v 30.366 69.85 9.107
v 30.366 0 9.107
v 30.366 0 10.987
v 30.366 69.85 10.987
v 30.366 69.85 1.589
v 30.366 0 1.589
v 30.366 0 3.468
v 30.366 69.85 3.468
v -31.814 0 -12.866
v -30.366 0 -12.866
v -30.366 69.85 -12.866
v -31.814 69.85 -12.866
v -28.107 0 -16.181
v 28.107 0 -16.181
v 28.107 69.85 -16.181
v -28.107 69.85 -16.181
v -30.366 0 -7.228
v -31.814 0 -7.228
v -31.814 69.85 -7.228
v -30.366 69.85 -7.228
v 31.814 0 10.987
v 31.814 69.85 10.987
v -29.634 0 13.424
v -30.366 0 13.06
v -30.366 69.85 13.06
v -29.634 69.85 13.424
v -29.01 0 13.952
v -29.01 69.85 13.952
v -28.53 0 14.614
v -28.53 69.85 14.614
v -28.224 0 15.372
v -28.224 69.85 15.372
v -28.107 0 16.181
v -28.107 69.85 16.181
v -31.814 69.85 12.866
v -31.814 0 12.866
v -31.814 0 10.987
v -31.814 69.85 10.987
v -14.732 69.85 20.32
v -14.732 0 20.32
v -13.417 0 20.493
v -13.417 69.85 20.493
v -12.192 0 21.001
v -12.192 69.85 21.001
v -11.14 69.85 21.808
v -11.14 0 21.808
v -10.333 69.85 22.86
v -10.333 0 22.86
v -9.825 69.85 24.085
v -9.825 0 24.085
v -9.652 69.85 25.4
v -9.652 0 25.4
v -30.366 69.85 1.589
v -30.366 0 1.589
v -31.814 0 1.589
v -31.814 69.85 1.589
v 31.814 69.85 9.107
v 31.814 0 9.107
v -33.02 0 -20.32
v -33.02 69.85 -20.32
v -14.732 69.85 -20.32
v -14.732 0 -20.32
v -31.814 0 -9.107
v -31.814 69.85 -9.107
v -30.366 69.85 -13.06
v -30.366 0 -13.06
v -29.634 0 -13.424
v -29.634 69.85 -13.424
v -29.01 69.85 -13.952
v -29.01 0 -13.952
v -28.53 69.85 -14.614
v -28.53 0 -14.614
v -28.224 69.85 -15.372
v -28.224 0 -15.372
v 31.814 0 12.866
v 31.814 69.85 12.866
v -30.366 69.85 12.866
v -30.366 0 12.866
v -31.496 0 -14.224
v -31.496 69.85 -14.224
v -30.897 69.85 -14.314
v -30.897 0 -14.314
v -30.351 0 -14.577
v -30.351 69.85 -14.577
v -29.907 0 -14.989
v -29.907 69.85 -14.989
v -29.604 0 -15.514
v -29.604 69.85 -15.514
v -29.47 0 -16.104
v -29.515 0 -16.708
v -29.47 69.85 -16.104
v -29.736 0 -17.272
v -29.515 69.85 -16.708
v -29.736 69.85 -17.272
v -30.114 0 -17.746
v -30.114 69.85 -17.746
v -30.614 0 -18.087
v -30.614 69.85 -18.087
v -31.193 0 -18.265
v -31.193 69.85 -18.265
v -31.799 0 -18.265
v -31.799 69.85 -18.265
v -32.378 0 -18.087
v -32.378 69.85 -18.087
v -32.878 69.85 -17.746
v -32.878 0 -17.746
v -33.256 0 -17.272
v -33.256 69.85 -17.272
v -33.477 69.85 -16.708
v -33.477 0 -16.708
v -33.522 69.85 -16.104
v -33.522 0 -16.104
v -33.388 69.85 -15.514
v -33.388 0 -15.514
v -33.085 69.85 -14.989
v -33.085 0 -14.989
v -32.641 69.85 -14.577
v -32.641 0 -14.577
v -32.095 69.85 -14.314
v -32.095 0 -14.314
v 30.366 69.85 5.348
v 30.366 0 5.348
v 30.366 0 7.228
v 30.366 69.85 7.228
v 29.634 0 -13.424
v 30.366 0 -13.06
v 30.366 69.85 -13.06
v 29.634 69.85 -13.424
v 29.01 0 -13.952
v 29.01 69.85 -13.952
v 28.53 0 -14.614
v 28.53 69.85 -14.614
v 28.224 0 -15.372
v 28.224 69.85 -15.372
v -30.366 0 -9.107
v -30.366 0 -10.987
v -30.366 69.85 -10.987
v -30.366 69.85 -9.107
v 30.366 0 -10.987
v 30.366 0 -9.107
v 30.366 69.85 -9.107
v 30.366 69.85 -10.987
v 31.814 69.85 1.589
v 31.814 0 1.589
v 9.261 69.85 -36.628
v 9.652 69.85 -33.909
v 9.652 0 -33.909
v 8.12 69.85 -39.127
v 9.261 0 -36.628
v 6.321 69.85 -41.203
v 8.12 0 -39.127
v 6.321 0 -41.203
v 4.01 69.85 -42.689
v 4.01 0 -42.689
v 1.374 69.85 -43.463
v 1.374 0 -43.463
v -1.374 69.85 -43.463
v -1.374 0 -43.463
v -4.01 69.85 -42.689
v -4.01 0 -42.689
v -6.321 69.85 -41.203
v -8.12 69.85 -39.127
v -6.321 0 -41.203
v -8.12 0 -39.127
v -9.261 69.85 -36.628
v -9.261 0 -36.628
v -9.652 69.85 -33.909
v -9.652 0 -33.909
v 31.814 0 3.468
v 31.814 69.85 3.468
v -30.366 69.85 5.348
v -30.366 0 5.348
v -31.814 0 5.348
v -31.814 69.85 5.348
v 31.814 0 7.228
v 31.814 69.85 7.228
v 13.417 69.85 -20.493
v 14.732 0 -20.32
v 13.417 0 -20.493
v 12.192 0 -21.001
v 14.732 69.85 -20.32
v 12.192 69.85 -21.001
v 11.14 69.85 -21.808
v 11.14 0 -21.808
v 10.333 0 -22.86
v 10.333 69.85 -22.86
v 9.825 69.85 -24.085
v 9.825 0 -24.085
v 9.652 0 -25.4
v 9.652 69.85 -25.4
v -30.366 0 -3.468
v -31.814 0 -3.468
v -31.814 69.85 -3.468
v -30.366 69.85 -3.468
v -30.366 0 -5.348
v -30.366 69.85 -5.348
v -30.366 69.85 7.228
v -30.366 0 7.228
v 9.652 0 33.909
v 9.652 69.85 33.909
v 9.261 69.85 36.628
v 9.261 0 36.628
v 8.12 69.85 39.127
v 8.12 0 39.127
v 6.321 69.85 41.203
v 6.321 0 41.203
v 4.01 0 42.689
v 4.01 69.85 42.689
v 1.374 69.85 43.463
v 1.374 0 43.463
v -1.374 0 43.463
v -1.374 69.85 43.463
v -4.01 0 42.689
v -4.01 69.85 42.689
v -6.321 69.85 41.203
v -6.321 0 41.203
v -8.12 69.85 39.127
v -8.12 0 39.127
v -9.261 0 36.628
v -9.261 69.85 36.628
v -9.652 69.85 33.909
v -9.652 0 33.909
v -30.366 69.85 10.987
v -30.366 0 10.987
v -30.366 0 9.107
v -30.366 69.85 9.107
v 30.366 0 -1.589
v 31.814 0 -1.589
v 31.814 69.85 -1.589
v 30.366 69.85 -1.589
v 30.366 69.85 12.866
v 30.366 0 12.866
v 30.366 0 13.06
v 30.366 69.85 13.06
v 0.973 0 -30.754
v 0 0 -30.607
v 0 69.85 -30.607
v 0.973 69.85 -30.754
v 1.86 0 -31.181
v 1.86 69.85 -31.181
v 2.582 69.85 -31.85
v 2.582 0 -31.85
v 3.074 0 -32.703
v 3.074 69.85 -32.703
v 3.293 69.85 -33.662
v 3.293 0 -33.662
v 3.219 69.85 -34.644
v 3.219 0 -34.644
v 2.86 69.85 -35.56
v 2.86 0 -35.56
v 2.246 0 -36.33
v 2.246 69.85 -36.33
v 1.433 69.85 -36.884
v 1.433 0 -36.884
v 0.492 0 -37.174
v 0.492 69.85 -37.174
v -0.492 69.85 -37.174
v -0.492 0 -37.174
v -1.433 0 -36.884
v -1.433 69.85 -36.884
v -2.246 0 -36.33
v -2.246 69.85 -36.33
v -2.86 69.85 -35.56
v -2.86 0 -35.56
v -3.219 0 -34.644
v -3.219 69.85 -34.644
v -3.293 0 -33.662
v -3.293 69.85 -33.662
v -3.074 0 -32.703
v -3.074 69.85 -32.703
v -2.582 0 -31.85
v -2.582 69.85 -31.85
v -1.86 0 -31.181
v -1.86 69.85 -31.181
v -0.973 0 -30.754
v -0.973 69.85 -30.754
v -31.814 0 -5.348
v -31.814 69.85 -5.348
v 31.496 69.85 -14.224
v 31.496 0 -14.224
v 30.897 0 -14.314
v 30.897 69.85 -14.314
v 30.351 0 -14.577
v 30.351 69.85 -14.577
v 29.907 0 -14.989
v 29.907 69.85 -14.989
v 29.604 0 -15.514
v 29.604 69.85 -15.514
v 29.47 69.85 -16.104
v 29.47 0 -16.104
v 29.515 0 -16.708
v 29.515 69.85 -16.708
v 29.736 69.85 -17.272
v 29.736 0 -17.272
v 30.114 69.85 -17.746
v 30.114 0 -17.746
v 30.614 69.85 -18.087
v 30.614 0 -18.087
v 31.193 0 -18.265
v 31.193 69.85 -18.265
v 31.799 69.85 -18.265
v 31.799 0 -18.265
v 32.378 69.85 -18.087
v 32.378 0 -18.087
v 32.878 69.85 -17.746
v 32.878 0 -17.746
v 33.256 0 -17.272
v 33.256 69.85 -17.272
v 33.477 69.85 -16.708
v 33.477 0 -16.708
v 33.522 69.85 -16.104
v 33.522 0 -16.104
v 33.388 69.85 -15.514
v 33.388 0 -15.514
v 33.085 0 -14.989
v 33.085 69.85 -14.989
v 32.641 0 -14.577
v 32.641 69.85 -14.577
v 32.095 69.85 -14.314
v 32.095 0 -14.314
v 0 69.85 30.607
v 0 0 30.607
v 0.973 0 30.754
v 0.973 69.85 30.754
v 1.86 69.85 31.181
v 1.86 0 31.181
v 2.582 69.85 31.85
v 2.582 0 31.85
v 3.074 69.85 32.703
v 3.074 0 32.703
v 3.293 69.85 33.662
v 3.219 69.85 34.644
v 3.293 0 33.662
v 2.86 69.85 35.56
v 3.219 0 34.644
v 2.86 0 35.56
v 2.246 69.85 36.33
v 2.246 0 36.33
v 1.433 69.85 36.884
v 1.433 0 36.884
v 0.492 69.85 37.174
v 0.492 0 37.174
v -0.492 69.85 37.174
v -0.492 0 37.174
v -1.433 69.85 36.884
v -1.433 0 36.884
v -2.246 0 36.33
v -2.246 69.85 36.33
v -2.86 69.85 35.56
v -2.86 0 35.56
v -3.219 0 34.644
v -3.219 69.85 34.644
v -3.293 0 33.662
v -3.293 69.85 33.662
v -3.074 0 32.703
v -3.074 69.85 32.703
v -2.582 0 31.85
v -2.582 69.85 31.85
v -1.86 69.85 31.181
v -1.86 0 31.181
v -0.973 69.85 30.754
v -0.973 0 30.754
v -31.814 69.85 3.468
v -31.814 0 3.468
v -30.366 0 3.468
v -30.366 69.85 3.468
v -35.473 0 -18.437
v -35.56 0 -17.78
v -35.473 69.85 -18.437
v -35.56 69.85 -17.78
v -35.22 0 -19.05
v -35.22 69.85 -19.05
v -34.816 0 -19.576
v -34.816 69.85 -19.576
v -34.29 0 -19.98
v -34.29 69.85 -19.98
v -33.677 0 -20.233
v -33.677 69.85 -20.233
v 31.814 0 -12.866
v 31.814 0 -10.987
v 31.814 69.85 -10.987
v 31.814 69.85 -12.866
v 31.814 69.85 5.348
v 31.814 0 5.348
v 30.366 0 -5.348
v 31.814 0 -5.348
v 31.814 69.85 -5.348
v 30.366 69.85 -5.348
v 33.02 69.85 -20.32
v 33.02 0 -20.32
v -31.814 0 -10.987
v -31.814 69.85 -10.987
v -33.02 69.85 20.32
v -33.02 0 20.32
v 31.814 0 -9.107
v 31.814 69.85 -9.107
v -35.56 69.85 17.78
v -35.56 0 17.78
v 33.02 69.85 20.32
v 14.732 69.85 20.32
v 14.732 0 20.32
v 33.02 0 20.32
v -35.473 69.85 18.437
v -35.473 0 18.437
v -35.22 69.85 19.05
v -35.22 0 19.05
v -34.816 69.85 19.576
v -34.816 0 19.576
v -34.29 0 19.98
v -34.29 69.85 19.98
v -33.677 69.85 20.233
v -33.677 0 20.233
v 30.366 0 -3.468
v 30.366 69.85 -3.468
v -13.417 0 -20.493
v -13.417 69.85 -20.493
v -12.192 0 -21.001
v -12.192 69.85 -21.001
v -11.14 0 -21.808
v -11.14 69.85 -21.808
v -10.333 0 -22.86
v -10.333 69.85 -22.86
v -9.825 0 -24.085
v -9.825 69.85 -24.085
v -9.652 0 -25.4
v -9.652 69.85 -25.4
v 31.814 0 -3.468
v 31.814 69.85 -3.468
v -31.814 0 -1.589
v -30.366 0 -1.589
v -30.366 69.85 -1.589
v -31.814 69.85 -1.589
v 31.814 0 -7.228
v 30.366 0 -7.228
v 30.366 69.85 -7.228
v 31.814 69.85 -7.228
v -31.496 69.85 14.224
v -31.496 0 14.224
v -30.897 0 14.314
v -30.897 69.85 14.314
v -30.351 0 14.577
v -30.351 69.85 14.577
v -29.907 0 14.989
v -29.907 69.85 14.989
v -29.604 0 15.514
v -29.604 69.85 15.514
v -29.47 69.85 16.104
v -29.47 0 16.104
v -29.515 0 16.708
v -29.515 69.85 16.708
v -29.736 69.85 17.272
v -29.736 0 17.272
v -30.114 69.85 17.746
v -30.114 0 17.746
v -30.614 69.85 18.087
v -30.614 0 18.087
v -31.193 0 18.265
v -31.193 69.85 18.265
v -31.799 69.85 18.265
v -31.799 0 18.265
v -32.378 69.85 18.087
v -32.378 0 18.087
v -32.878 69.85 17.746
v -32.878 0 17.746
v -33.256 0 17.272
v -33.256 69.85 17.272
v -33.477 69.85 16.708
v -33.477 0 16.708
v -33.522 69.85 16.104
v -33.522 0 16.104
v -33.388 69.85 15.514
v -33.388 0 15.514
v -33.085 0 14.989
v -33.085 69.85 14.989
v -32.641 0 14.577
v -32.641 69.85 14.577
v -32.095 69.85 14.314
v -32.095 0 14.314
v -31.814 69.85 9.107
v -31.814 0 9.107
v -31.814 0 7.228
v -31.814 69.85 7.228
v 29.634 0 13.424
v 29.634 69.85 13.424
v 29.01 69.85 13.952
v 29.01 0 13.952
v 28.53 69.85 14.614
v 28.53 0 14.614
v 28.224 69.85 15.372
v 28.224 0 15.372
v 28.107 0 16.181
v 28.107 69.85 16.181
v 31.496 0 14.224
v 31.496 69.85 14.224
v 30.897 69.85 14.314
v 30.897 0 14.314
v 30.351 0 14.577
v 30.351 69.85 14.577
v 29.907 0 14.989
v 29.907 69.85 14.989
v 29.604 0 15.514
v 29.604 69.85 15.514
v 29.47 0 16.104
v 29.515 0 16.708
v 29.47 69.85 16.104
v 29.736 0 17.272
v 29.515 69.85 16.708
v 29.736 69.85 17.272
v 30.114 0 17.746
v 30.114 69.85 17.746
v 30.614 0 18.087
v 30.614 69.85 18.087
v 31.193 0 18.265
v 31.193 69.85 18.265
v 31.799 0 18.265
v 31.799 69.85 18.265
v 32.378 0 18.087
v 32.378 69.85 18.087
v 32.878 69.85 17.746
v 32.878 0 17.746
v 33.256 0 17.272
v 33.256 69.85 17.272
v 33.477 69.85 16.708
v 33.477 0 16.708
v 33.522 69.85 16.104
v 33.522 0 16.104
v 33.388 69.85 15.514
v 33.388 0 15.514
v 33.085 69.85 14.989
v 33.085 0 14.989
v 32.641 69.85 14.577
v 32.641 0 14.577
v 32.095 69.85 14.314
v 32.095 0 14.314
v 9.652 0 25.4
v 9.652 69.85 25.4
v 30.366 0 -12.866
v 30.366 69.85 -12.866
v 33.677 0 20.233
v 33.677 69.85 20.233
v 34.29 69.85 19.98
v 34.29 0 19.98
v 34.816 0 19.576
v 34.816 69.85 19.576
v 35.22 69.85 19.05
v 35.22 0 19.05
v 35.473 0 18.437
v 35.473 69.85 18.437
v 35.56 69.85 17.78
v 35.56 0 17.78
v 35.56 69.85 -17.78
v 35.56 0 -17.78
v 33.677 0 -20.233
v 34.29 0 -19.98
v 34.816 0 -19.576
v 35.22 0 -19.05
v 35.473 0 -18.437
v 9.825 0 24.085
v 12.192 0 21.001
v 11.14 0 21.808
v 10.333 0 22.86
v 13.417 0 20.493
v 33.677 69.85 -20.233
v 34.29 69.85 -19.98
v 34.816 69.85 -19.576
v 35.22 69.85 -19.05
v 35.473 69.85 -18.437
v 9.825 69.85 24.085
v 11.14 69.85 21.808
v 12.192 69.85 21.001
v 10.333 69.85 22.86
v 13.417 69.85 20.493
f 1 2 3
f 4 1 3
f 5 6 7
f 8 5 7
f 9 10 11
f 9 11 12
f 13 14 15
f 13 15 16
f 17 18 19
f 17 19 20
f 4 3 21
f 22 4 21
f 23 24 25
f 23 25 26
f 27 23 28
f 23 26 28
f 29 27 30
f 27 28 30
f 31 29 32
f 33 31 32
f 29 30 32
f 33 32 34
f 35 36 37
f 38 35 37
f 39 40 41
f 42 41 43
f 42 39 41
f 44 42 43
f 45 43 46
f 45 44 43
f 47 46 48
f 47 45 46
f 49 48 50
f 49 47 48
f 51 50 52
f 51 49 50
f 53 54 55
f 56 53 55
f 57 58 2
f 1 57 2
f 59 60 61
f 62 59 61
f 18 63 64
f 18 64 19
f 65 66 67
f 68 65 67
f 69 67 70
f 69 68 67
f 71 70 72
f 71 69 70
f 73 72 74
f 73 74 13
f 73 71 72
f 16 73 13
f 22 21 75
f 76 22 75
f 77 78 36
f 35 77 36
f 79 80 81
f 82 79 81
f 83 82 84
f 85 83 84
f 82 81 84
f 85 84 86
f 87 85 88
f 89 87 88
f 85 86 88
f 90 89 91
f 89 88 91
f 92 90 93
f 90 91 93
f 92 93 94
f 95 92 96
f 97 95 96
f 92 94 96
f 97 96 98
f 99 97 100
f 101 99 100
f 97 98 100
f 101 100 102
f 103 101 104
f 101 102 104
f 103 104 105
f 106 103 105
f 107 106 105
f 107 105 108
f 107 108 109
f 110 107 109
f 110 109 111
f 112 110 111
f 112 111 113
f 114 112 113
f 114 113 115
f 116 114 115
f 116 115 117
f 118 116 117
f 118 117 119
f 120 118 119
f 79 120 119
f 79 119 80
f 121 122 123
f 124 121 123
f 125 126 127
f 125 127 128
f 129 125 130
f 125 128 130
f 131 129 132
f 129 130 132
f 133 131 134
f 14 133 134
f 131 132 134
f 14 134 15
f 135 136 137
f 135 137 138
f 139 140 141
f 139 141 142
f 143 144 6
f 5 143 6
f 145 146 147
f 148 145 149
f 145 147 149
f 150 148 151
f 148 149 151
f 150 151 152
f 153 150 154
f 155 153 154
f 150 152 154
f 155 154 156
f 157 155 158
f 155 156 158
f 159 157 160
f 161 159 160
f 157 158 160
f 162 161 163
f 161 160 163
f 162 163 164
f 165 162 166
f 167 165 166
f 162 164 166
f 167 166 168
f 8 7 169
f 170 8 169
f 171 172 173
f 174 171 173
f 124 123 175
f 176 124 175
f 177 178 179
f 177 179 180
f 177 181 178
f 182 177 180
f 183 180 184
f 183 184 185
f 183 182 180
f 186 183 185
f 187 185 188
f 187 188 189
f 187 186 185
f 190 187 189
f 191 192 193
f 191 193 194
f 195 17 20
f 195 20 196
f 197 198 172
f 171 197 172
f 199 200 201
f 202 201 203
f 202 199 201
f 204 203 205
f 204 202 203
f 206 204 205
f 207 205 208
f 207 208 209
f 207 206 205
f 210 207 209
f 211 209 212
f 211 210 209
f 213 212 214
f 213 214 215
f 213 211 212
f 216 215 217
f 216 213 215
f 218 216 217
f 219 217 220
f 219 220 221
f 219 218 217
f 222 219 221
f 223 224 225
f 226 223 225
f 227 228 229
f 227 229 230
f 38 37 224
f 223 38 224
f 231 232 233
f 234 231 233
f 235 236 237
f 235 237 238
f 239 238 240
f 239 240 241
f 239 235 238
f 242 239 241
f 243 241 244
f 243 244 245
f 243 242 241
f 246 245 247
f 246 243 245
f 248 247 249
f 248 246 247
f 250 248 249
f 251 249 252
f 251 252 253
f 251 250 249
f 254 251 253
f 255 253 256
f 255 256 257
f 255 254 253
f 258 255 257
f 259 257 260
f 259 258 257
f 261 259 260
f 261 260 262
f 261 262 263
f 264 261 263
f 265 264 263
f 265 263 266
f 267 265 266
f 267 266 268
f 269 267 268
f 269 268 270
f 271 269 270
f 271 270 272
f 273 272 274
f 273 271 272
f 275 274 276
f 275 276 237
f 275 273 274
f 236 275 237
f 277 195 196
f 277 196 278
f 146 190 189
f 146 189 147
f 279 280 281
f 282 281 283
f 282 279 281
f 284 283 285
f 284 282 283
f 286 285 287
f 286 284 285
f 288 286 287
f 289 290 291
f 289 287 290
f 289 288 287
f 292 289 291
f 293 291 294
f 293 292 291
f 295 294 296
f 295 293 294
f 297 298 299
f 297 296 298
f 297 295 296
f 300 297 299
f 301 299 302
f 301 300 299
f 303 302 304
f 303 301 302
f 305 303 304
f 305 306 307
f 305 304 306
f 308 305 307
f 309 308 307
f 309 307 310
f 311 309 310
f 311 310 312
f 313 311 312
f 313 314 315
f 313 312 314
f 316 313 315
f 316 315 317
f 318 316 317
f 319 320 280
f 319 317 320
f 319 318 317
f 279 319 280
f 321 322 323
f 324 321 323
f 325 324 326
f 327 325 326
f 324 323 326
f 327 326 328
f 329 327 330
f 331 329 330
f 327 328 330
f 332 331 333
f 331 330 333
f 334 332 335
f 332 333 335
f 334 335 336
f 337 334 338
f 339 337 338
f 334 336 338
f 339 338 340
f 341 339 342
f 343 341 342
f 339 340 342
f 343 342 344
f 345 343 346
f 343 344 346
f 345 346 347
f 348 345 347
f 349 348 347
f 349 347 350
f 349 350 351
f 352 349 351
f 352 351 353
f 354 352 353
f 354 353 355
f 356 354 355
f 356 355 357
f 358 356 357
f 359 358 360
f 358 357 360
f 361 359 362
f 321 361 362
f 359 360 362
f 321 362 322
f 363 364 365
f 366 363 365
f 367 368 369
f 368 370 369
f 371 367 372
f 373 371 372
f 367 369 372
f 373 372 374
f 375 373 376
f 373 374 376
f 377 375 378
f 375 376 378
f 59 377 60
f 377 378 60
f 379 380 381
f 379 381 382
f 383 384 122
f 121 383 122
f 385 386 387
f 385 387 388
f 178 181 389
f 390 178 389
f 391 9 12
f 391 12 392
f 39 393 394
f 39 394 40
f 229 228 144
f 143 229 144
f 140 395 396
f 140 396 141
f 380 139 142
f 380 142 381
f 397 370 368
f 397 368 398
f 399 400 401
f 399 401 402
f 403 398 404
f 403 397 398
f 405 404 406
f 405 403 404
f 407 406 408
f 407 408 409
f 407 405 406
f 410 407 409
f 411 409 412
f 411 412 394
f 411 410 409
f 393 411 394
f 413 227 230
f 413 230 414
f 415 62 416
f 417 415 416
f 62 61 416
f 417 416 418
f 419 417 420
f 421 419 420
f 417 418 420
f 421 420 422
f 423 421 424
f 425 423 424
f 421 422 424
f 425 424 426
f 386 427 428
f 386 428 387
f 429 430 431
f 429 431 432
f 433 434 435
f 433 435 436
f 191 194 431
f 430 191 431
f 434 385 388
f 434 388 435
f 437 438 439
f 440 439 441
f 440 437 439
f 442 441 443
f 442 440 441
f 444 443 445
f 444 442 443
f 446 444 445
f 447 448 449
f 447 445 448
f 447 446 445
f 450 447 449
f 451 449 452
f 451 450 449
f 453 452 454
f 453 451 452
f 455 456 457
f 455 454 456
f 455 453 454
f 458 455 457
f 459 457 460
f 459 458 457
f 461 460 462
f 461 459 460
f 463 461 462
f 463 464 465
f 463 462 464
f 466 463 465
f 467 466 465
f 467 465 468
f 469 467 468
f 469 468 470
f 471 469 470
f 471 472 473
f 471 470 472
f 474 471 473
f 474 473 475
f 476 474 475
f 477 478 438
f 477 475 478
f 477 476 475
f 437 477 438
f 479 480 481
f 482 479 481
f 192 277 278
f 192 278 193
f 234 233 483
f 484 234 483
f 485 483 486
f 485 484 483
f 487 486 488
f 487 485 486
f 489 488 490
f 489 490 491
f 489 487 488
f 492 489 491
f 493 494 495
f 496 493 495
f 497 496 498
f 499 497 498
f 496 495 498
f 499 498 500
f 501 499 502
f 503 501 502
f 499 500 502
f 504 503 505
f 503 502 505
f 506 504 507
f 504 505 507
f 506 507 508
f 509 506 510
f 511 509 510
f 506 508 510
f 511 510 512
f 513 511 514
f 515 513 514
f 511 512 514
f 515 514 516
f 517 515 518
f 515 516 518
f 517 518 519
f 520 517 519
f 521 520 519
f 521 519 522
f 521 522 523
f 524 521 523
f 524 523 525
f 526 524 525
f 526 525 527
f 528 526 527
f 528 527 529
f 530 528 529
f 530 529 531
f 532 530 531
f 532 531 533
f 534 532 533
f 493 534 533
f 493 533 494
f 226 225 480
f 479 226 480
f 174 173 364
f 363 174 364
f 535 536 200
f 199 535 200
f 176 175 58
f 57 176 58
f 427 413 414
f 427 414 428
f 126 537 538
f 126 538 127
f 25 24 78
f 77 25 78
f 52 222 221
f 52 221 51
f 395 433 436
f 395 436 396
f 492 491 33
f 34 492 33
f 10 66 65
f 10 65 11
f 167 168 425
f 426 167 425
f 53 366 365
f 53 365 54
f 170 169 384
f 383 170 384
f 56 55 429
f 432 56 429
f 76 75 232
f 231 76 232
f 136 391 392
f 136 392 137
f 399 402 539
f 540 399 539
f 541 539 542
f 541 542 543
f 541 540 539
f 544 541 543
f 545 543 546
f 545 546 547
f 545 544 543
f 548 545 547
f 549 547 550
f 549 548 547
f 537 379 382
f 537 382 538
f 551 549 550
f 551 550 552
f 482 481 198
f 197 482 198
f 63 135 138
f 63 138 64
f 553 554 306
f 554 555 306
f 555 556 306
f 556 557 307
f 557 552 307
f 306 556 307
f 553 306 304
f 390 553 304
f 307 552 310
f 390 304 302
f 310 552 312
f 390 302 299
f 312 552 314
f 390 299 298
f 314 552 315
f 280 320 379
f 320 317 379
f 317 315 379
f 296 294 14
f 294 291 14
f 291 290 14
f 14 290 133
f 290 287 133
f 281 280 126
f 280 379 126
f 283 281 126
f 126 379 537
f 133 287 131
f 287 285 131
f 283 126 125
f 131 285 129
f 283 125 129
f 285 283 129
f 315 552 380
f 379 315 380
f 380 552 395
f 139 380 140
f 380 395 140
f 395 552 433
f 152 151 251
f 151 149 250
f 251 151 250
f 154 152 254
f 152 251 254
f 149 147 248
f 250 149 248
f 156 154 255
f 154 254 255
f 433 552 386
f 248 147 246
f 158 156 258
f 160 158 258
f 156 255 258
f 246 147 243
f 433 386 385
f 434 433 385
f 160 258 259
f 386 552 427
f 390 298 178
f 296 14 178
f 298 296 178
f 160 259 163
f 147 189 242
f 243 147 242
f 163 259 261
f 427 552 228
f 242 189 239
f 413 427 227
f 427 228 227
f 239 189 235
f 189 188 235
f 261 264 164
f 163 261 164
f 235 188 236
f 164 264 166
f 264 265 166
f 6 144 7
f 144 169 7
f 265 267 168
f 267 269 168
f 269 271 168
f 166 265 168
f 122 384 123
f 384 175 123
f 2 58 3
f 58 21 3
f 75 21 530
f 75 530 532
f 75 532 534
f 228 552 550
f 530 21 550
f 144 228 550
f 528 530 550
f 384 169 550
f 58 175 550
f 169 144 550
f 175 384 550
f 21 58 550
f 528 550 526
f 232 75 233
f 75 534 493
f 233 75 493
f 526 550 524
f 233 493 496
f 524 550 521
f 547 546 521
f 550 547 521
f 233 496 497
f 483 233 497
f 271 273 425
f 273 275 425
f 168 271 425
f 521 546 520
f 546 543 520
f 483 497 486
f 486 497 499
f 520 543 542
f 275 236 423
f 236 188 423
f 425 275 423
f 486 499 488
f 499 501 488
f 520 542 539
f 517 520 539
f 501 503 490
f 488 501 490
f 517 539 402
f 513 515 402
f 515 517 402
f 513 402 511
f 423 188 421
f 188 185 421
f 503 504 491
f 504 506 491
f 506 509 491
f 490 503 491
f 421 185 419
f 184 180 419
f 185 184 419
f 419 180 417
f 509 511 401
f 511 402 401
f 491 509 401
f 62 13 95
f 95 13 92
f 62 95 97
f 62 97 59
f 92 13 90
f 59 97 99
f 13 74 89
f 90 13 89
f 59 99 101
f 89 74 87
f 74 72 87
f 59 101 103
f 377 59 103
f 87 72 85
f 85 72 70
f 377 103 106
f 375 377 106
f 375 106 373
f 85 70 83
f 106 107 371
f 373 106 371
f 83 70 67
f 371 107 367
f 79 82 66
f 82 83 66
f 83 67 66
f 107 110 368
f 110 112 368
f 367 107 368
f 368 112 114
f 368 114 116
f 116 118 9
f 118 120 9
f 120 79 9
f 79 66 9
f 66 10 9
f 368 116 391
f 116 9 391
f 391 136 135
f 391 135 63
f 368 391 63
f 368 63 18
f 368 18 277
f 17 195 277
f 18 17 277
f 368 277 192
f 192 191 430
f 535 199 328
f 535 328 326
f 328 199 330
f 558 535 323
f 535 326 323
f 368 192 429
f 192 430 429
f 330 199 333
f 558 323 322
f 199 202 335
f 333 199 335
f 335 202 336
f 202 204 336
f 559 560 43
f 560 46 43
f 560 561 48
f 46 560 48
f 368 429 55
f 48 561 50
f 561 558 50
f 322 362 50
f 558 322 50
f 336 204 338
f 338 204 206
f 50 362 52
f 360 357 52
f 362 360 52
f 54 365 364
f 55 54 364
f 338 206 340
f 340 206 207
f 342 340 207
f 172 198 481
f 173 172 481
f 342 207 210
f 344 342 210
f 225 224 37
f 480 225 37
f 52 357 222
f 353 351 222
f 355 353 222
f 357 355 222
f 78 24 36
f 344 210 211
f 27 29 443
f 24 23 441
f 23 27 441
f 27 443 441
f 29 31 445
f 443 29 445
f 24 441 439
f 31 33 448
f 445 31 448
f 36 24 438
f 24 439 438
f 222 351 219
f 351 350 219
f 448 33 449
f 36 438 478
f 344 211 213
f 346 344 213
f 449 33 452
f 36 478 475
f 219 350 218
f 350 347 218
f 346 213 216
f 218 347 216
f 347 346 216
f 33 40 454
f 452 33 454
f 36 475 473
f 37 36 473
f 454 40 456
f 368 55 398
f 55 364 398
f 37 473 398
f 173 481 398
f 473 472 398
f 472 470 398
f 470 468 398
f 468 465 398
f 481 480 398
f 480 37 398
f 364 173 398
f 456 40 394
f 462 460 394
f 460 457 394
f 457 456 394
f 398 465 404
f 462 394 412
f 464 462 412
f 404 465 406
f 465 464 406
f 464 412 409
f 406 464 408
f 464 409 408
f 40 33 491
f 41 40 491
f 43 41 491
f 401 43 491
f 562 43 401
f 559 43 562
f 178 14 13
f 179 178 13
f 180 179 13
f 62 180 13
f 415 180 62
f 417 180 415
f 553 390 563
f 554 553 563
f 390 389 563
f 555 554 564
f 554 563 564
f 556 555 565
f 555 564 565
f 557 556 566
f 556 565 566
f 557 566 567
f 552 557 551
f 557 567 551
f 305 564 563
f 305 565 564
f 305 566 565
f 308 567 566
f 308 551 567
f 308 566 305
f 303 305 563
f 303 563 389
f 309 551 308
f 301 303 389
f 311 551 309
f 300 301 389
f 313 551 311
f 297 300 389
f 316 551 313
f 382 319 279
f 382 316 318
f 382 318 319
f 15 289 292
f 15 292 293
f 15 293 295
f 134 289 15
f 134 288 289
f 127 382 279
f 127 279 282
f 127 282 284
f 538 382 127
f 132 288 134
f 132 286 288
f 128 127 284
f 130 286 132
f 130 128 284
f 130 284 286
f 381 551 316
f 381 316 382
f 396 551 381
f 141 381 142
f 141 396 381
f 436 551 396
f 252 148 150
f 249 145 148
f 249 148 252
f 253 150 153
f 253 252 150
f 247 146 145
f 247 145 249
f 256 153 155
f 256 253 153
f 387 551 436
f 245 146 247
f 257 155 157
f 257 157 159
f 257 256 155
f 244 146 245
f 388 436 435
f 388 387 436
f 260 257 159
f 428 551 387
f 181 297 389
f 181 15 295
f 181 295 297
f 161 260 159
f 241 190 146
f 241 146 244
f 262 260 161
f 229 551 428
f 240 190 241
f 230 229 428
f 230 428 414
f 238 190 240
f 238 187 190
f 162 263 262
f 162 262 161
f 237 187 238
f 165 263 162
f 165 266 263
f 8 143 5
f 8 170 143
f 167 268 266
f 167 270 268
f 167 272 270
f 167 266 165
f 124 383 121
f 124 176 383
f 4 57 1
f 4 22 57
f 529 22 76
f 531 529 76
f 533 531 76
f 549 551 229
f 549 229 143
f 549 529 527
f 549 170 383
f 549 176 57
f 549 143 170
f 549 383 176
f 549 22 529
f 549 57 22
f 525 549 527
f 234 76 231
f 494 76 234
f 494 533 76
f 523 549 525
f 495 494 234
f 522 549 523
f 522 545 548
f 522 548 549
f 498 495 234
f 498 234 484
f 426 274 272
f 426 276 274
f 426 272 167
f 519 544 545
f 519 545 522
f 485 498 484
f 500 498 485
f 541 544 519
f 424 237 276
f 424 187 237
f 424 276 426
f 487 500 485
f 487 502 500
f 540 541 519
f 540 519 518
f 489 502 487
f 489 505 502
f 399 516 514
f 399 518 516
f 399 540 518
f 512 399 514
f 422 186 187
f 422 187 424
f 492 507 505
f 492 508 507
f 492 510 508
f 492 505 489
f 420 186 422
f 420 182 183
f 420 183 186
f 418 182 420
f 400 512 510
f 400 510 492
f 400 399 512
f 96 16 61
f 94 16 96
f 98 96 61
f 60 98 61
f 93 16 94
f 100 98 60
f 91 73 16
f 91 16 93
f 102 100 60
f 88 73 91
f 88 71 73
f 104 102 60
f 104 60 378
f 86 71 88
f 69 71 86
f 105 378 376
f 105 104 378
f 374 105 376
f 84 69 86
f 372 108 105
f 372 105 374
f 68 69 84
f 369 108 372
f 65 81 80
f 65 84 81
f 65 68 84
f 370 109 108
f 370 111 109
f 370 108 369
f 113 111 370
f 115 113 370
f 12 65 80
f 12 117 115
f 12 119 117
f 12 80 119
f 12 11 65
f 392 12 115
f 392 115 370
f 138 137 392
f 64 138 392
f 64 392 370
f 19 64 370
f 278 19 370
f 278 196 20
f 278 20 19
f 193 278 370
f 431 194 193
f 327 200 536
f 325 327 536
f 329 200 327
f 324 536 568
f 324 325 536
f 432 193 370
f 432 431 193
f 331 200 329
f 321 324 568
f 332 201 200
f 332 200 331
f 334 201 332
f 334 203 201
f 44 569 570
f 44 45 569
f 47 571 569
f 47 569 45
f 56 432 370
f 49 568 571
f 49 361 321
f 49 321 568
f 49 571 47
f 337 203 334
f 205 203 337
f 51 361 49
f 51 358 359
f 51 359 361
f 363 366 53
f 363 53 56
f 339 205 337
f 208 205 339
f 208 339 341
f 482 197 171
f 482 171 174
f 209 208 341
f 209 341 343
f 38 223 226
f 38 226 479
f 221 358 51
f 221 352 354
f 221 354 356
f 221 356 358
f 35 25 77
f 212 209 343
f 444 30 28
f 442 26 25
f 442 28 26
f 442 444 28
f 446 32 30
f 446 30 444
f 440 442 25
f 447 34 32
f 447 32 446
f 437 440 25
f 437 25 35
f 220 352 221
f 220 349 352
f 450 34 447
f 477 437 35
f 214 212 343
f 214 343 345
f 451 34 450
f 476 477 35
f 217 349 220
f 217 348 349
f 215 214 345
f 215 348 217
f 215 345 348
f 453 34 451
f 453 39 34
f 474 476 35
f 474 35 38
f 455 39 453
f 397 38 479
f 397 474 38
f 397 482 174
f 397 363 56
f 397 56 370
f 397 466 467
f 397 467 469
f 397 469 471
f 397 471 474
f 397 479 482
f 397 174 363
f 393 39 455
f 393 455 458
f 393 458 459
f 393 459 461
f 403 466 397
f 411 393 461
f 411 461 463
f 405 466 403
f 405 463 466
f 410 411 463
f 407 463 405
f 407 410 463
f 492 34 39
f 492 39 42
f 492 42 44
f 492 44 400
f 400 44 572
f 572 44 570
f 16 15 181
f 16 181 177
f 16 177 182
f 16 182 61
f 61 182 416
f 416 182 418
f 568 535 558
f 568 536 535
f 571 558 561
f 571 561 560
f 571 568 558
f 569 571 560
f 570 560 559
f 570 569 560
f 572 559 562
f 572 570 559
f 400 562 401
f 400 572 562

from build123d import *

# Parameters (mm, degrees)
BOSS_EXTRUDE1_DEPTH                        = 69.85
FILLET1_R                                  = 2.54
SKETCH4_R                                  = 3.302
BOSS_EXTRUDE3_DEPTH                        = 69.85
FILLET2_R                                  = 5.08
SKETCH5_R                                  = 3.38963
BOSS_EXTRUDE4_DEPTH                        = 69.85
FILLET1_OF_MIRROR1_R                       = 2.54
FILLET2_OF_MIRROR1_R                       = 5.08
MIRROR2_AT_THE_SECOND_PLANE_COPY_1_SKETC_R = 3.38963
MIRROR2_AT_THE_SECOND_PLANE_COPY_1_DEPTH   = 69.85
SKETCH6_R                                  = 2.032
CUT_EXTRUDE1_DEPTH                         = 90.672163022
MIRROR3_AT_THE_SECOND_PLANE_COPY_1_SKETC_R = 2.032
MIRROR3_AT_THE_SECOND_PLANE_COPY_1_DEPTH   = 90.672163022


with BuildPart() as part:
    # Sketch1 → Boss-Extrude1 (new body)
    with BuildSketch(Plane(origin=(0, 0, 0), x_dir=(1, 0, 0), z_dir=(0, 1, 0))):
        Polygon((30.3657, 16.18107), (-30.3657, 16.18107), (-30.3657, 12.86637), (-31.8135, 12.86637), (-31.8135, 10.98677), (-30.3657, 10.98677), (-30.3657, 9.10717), (-31.8135, 9.10717), (-31.8135, 7.22757), (-30.3657, 7.22757), (-30.3657, 5.34797), (-31.8135, 5.34797), (-31.8135, 3.46837), (-30.3657, 3.46837), (-30.3657, 1.58877), (-31.8135, 1.58877), (-31.8135, 0), (-35.56, 0), (-35.56, 20.32), (35.56, 20.32), (35.56, 0), (31.8135, 0), (31.8135, 1.58877), (30.3657, 1.58877), (30.3657, 3.46837), (31.8135, 3.46837), (31.8135, 5.34797), (30.3657, 5.34797), (30.3657, 7.22757), (31.8135, 7.22757), (31.8135, 9.10717), (30.3657, 9.10717), (30.3657, 10.98677), (31.8135, 10.98677), (31.8135, 12.86637), (30.3657, 12.86637), align=None)
    boss_extrude1 = extrude(amount=BOSS_EXTRUDE1_DEPTH)

    # Fillet1
    fillet1_edges = [part.edges().sort_by_distance(p)[0] for p in [
        (-35.56, 34.925, -20.32),
        (35.56, 34.925, -20.32),
    ]]
    fillet(fillet1_edges, radius=FILLET1_R)

    # Sketch4 → Boss-Extrude3 (add, through all)
    with BuildSketch(Plane(origin=(0, 0, 0), x_dir=(1, 0, 0), z_dir=(0, 1, 0))):
        with BuildLine():
            Line((-9.652, 33.909), (-9.652, 20.32))
            Line((-9.652, 20.32), (9.652, 20.32))
            Line((9.652, 20.32), (9.652, 33.909))
            ThreePointArc((9.652, 33.909), (0, 43.561), (-9.652, 33.909))
        make_face()
        with Locations(Location((0, 33.909, 0), (0, 0, 270))):
            Circle(SKETCH4_R, mode=Mode.SUBTRACT)
    boss_extrude3 = extrude(amount=BOSS_EXTRUDE3_DEPTH)

    # Fillet2
    fillet2_edges = [part.edges().sort_by_distance(p)[0] for p in [
        (-9.652, 34.925, -20.32),
        (9.652, 34.925, -20.32),
    ]]
    fillet(fillet2_edges, radius=FILLET2_R)

    # Sketch5 → Boss-Extrude4 (add)
    with BuildSketch(Plane(origin=(0, 69.85, 0), x_dir=(1, 0, 0), z_dir=(0, 1, 0))):
        with Locations((-31.496, 16.256)):
            Circle(SKETCH5_R)
    boss_extrude4 = extrude(amount=-BOSS_EXTRUDE4_DEPTH)

    # Mirror1: Boss-Extrude1, Boss-Extrude3 across plane
    add(boss_extrude1.mirror(Plane.XY))
    add(boss_extrude3.mirror(Plane.XY))

    # Fillet1 of Mirror1
    fillet1_of_mirror1_edges = [part.edges().sort_by_distance(p)[0] for p in [
        (-35.56, 34.925, 20.32),
        (35.56, 34.925, 20.32),
    ]]
    fillet(fillet1_of_mirror1_edges, radius=FILLET1_OF_MIRROR1_R)

    # Fillet2 of Mirror1
    fillet2_of_mirror1_edges = [part.edges().sort_by_distance(p)[0] for p in [
        (-9.652, 34.925, 20.32),
        (9.652, 34.925, 20.32),
    ]]
    fillet(fillet2_of_mirror1_edges, radius=FILLET2_OF_MIRROR1_R)

    # Mirror2: Boss-Extrude4 across plane
    add(boss_extrude4.mirror(Plane.XY))

    # Mirror2 at the second plane: Boss-Extrude4 across plane
    add(boss_extrude4.mirror(Plane(origin=(0, 0, 0), x_dir=(0, 0, 1), z_dir=(1, 0, 0))))

    # Mirror2 at the second plane copy 1 sketc → Mirror2 at the second plane copy 1 (add)
    with BuildSketch(Plane(origin=(0, 69.85, 0), x_dir=(-1, 0, 0), z_dir=(0, 1, 0))):
        with Locations((-31.496, 16.256)):
            Circle(MIRROR2_AT_THE_SECOND_PLANE_COPY_1_SKETC_R)
    extrude(amount=-MIRROR2_AT_THE_SECOND_PLANE_COPY_1_DEPTH)

    # Sketch6 → Cut-Extrude1 (cut, through all)
    with BuildSketch(Plane(origin=(0, 69.85, 0), x_dir=(1, 0, 0), z_dir=(0, 1, 0))):
        with Locations(Location((-31.496, 16.256, 0), (0, 0, 270))):
            Circle(SKETCH6_R)
    cut_extrude1 = extrude(amount=-CUT_EXTRUDE1_DEPTH, mode=Mode.SUBTRACT)

    # Mirror3: Cut-Extrude1 across plane
    add(cut_extrude1.mirror(Plane.XY), mode=Mode.SUBTRACT)

    # Mirror3 at the second plane: Cut-Extrude1 across plane
    add(cut_extrude1.mirror(Plane(origin=(0, 0, 0), x_dir=(0, 0, 1), z_dir=(1, 0, 0))), mode=Mode.SUBTRACT)

    # Mirror3 at the second plane copy 1 sketc → Mirror3 at the second plane copy 1 (cut, through all)
    with BuildSketch(Plane(origin=(0, 69.85, 0), x_dir=(-1, 0, 0), z_dir=(0, 1, 0))):
        with Locations(Location((-31.496, 16.256, 0), (0, 0, 270))):
            Circle(MIRROR3_AT_THE_SECOND_PLANE_COPY_1_SKETC_R)
    extrude(amount=-MIRROR3_AT_THE_SECOND_PLANE_COPY_1_DEPTH, mode=Mode.SUBTRACT)


solid = part.part
